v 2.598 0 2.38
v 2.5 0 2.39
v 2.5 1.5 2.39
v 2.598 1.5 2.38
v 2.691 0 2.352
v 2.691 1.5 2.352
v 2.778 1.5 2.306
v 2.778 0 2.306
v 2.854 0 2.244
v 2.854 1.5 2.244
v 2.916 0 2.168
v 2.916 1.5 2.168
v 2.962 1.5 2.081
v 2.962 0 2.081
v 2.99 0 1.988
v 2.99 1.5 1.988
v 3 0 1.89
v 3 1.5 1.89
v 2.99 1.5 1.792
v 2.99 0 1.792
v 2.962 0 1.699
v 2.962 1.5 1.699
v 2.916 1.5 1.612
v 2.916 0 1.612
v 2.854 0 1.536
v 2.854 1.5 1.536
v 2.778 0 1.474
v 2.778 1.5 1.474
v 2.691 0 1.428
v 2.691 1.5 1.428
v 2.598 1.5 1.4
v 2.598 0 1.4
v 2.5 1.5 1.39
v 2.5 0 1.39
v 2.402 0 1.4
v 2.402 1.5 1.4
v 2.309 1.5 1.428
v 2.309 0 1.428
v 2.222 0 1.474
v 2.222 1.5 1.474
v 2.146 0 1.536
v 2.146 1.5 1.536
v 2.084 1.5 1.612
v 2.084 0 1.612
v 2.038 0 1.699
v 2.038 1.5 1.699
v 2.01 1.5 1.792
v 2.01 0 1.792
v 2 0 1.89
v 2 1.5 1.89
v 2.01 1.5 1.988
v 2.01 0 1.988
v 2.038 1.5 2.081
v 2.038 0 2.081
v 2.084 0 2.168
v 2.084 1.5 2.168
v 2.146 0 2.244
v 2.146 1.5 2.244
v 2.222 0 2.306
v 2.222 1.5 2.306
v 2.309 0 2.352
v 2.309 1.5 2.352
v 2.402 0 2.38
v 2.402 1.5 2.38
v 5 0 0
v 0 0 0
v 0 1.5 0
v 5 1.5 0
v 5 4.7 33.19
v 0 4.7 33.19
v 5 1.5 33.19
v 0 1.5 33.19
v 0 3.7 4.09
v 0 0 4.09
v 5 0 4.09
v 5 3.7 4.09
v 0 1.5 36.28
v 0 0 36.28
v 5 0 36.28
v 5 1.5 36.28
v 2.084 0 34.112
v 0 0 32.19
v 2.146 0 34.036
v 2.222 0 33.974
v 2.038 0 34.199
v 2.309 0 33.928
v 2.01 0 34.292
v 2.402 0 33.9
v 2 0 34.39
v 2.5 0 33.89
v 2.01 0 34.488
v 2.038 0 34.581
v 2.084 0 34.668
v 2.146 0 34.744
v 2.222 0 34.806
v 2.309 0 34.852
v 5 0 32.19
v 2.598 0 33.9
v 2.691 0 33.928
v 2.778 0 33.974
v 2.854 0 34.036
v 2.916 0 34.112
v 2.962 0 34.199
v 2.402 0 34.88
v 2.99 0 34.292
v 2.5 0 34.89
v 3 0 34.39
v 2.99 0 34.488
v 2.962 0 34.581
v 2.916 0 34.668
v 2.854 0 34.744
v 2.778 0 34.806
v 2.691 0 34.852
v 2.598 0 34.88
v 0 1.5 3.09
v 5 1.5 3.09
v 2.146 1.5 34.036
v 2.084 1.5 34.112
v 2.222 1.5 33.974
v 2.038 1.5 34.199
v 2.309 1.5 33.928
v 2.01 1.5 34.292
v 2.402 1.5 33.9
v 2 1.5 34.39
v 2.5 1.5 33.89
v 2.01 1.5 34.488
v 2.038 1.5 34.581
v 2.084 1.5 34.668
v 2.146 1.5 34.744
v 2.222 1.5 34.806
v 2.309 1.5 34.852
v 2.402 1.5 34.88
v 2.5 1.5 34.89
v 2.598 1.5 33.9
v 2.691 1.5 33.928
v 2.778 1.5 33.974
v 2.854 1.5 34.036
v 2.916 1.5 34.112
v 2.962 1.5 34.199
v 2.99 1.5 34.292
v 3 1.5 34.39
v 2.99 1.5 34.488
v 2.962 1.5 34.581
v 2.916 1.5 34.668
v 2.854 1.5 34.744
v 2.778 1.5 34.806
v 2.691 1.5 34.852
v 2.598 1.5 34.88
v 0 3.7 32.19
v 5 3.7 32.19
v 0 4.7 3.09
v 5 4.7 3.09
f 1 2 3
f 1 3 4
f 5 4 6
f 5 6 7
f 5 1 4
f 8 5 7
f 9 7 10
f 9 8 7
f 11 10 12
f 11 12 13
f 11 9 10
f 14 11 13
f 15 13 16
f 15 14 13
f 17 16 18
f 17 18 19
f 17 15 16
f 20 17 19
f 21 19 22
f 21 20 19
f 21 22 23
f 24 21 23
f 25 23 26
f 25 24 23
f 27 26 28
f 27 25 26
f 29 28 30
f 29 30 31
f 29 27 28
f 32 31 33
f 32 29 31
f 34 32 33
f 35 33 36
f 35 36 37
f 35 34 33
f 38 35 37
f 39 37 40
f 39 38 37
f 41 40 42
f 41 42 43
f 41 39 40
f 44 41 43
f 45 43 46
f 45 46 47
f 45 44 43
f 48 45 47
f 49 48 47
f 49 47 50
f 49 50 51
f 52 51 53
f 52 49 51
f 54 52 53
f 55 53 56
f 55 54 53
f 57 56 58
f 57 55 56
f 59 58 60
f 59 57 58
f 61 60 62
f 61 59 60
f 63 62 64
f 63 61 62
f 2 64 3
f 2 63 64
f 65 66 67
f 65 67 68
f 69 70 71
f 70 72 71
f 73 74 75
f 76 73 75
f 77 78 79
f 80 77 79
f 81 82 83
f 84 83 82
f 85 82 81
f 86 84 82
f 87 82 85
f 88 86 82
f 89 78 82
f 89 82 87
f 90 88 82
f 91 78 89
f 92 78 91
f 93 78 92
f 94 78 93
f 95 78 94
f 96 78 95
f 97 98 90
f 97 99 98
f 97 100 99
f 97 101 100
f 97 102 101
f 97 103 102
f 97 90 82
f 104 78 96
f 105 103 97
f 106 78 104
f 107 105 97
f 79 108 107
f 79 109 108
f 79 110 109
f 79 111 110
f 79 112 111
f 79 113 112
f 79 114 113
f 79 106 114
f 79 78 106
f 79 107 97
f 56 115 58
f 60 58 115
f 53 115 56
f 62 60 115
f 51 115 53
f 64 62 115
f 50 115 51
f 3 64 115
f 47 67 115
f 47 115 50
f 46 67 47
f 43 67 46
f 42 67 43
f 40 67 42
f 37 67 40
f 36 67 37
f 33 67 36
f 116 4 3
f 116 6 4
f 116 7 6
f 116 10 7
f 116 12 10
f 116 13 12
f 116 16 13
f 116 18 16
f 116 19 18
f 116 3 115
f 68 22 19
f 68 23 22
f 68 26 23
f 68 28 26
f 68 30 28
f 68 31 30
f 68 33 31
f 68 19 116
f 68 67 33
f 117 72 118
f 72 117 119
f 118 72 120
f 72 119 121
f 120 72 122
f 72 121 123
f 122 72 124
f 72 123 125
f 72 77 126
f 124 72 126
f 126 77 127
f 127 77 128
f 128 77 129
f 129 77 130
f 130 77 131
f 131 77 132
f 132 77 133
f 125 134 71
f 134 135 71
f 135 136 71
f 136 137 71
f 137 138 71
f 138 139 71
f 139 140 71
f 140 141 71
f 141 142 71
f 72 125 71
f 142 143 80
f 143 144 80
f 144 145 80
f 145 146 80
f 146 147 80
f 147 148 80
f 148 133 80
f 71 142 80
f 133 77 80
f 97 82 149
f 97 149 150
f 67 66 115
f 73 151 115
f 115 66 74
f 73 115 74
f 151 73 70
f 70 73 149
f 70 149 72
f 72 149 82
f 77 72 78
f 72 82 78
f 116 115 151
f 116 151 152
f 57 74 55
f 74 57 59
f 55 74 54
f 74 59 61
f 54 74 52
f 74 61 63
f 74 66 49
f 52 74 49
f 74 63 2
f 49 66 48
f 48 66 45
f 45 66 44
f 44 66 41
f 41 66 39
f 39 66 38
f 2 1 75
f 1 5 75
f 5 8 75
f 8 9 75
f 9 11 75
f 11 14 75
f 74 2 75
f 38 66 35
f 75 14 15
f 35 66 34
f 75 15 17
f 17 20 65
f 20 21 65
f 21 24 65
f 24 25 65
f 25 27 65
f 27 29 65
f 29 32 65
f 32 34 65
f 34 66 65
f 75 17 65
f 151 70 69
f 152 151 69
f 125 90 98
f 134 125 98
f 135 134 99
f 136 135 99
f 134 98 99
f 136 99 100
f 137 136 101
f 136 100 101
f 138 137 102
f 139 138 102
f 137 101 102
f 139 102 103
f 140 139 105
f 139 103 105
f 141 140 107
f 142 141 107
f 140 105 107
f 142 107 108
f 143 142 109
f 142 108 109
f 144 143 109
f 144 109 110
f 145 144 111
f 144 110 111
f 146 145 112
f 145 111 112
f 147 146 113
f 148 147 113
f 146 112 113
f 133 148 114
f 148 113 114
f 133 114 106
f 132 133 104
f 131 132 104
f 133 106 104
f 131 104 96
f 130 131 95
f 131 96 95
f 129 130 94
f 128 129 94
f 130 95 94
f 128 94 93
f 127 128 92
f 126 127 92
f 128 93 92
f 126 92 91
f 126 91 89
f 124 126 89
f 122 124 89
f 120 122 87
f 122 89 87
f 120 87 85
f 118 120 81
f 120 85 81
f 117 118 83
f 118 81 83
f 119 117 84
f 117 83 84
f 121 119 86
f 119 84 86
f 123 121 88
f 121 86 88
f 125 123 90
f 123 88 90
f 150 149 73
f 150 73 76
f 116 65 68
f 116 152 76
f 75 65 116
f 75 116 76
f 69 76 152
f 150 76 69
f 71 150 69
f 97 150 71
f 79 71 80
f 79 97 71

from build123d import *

# Parameters (mm, degrees)
SKETCH_1_W      = 5
SKETCH_1_H      = 4.09
SKETCH_1_R      = 0.5
EXTRUDE_1_DEPTH = 1.5
SKETCH_1_3_W    = 5
SKETCH_1_3_H    = 1
EXTRUDE_2_DEPTH = 3.7
SKETCH_2_W      = 5
SKETCH_2_H      = 15.05
EXTRUDE_3_DEPTH = 1


with BuildPart() as part:
    # Эскиз1 → Бобышка-Вытянуть1 (new body)
    with BuildSketch(Plane(origin=(0, 0, 0), x_dir=(1, 0, 0), z_dir=(0, 1, 0))):
        with Locations((2.5, -2.045)):
            Rectangle(SKETCH_1_W, SKETCH_1_H)
        with Locations((2.5, -1.89)):
            Circle(SKETCH_1_R, mode=Mode.SUBTRACT)
    extrude_1 = extrude(amount=EXTRUDE_1_DEPTH)

    # Эскиз1<3> → Бобышка-Вытянуть2 (add)
    with BuildSketch(Plane(origin=(0, 0, 0), x_dir=(1, 0, 0), z_dir=(0, 1, 0))):
        with Locations((2.5, -3.59)):
            Rectangle(SKETCH_1_3_W, SKETCH_1_3_H)
    extrude_2 = extrude(amount=EXTRUDE_2_DEPTH)

    # Эскиз2 → Бобышка-Вытянуть3 (add)
    with BuildSketch(Plane(origin=(0, 3.7, 0), x_dir=(1, 0, 0), z_dir=(0, 1, 0))):
        with Locations((2.5, -10.615)):
            Rectangle(SKETCH_2_W, SKETCH_2_H)
    extrude_3 = extrude(amount=EXTRUDE_3_DEPTH)

    # Зеркальное отражение1: Бобышка-Вытянуть1, Бобышка-Вытянуть2, Бобышка-Вытянуть3 across plane
    add(extrude_1.mirror(Plane(origin=(0, 4.7, 18.14), x_dir=(1, 0, 0), z_dir=(0, 0, -1))))
    add(extrude_2.mirror(Plane(origin=(0, 4.7, 18.14), x_dir=(1, 0, 0), z_dir=(0, 0, -1))))
    add(extrude_3.mirror(Plane(origin=(0, 4.7, 18.14), x_dir=(1, 0, 0), z_dir=(0, 0, -1))))


solid = part.part
